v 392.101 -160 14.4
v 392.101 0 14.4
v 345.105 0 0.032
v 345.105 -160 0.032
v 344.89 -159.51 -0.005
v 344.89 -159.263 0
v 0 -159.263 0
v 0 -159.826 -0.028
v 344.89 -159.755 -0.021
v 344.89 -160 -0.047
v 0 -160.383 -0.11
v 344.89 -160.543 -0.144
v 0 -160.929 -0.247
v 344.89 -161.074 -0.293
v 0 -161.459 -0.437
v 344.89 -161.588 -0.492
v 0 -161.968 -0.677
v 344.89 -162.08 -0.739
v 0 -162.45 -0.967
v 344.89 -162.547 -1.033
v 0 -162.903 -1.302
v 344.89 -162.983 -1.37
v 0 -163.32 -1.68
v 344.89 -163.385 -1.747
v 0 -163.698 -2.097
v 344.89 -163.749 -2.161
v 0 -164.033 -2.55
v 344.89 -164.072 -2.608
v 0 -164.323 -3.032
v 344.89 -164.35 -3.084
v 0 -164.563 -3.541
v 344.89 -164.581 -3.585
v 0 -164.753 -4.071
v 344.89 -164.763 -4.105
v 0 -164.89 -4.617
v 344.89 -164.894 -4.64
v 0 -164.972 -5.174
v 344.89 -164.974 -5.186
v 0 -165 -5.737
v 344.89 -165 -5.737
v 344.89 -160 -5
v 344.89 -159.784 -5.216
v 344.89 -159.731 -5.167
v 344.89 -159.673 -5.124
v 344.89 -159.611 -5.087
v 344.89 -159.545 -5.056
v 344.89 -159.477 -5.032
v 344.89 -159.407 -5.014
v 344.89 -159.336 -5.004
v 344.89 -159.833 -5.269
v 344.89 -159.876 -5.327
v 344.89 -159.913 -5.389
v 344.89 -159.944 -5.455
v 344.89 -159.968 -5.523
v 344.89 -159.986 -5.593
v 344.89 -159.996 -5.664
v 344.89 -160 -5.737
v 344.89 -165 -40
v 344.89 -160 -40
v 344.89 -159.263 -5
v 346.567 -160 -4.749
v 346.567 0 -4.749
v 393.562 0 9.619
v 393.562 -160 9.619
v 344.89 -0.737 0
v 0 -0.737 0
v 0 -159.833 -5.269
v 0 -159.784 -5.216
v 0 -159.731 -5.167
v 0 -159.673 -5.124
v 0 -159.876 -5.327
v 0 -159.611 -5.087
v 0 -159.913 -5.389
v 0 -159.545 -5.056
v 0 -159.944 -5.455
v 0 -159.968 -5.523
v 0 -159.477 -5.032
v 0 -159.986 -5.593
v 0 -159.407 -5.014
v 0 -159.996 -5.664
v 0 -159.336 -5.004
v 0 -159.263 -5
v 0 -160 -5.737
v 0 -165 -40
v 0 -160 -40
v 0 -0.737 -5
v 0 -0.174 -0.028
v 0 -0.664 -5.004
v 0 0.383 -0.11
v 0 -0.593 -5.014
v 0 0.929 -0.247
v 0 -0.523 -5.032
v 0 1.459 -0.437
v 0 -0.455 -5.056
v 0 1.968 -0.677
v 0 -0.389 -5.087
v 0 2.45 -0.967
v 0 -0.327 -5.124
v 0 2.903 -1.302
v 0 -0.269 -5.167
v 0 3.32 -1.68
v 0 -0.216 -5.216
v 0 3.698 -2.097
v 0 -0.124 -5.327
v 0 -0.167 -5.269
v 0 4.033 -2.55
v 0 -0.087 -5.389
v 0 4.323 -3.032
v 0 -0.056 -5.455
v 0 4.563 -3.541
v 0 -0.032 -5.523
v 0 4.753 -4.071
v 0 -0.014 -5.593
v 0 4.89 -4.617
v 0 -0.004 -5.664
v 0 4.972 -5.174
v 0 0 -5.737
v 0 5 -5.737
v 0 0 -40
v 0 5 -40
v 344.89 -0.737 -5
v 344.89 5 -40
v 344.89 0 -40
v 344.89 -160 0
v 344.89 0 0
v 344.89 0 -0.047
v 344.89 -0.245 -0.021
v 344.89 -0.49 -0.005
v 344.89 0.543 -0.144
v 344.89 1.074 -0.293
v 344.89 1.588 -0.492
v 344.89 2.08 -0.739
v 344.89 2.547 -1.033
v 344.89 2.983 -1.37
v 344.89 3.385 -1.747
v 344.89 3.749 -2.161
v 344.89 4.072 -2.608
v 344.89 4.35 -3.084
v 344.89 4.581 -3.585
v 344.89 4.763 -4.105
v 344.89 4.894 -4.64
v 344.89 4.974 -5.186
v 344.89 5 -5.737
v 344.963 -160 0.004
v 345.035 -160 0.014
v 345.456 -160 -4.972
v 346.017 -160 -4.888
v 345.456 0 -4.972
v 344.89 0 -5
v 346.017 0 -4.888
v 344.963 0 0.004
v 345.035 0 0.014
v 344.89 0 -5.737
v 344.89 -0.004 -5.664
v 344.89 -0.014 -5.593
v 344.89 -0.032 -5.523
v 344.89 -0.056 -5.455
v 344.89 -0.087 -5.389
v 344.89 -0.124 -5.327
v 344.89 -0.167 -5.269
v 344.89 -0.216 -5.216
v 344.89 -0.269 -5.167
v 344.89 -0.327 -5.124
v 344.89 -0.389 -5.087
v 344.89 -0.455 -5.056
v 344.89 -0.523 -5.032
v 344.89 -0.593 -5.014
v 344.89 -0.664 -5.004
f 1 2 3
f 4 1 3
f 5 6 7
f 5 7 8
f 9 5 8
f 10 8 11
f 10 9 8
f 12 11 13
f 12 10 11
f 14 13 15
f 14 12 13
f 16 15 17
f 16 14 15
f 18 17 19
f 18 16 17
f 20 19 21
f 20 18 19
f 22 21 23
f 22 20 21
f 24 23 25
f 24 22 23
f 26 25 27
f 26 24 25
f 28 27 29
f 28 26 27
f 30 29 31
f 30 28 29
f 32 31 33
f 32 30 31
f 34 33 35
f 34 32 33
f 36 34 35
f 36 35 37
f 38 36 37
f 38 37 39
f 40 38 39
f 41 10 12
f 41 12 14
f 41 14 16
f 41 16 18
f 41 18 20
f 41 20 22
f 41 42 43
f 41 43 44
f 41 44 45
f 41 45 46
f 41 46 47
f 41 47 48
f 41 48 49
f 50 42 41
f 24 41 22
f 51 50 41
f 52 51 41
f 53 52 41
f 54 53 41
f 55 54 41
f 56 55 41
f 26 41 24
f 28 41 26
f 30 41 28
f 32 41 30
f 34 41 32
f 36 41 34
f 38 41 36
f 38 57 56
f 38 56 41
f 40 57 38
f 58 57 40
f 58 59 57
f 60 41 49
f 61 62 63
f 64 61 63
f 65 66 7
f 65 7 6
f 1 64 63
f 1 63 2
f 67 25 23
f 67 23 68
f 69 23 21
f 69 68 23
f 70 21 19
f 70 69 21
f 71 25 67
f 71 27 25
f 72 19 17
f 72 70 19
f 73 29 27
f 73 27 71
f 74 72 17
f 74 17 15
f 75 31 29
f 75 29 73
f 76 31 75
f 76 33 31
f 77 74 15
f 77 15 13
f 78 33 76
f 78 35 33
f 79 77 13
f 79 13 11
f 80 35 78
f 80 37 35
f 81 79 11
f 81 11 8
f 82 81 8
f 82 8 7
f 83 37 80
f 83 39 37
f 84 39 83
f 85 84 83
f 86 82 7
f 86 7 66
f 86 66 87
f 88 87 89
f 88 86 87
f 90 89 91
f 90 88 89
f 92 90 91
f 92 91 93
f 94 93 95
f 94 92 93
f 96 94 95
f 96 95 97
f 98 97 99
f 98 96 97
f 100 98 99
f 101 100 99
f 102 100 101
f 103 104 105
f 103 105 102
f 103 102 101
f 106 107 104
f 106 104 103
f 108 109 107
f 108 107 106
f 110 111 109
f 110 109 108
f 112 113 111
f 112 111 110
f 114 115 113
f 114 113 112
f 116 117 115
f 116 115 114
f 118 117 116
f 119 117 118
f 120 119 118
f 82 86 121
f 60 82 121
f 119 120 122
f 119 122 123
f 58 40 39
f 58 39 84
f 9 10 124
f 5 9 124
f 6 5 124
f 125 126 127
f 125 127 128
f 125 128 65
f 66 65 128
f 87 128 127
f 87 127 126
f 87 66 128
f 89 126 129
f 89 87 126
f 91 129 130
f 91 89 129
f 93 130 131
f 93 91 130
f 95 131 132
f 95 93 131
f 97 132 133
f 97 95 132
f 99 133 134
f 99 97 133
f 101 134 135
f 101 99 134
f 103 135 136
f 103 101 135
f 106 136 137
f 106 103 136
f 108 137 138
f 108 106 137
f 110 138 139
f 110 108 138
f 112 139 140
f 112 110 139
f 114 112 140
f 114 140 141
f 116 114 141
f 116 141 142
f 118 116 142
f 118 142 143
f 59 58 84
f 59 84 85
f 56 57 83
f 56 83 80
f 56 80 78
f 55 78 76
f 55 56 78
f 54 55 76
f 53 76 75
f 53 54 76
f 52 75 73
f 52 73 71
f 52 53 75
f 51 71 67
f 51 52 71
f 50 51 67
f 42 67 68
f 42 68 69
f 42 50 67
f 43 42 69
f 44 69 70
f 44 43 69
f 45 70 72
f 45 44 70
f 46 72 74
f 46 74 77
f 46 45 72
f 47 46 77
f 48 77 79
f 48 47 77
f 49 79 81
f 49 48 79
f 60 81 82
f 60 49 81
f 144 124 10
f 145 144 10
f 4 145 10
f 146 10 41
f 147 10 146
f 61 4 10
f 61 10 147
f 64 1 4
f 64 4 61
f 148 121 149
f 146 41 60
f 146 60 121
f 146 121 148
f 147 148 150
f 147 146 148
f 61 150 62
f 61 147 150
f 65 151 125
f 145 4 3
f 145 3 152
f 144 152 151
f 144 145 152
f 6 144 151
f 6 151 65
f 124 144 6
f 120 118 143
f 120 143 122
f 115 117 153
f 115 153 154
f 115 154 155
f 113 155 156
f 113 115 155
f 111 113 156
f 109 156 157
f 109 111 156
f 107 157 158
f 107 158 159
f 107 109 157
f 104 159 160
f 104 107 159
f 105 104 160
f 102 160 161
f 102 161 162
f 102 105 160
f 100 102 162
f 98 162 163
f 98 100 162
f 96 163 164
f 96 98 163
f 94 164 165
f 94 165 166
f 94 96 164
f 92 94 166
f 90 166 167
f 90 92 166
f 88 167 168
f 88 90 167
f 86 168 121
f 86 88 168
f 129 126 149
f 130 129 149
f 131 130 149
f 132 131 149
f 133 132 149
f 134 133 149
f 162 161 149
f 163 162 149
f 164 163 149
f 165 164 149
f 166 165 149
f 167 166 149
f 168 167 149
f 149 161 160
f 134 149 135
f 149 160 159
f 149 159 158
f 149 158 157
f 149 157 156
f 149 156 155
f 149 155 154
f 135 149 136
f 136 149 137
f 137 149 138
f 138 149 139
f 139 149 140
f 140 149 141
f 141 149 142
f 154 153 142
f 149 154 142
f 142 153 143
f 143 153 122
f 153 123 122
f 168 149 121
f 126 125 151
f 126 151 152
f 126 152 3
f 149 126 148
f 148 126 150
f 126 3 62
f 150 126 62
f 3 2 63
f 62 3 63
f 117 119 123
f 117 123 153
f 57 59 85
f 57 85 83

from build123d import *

# Parameters (mm, degrees)
SKETCH1_W                      = 345
SKETCH1_H                      = 160
BASE_FLANGE1_DEPTH             = 5
EDGE_FLANGE1_STRIP_CUT_DEPTH   = 160
EDGE_FLANGE1_DEPTH             = 160
EDGE_FLANGE2_STRIP_W           = 21.4732
EDGE_FLANGE2_STRIP_H           = 5
EDGE_FLANGE2_STRIP_CUT_DEPTH   = 344.889914392
EDGE_FLANGE2_STRIP_2_W         = 21.4732
EDGE_FLANGE2_STRIP_2_H         = 5
EDGE_FLANGE2_STRIP_CUT_2_DEPTH = 344.889914392
EDGE_FLANGE2_DEPTH             = 344.889914392
EDGE_FLANGE2_BEND_DEPTH        = 344.889914392


# Sheet-metal steps are written as plain solids
with BuildPart() as part:
    # Sketch1 → Base-Flange1 (new body)
    with BuildSketch(Plane.XY):
        with Locations((172.5, -80)):
            Rectangle(SKETCH1_W, SKETCH1_H)
    extrude(amount=-BASE_FLANGE1_DEPTH)

    # Edge-Flange1 strip (across the edge) → Edge-Flange1 strip cut (cut)
    with BuildSketch(Plane(origin=(345, -160, 0), x_dir=(-0.29237170472273066, 0, 0.9563047559630373), z_dir=(0, 1, 0))):
        Polygon((-11.027493953, 18.967789372), (-4.749337863, -1.567133914), (0.032185917, -0.10527539), (-6.245970173, 20.429647896), align=None)
    extrude(amount=EDGE_FLANGE1_STRIP_CUT_DEPTH, mode=Mode.SUBTRACT)

    # Edge-Flange1 section (across the edge) → Edge-Flange1 (add)
    with BuildSketch(Plane(origin=(345, -160, 0), x_dir=(-0.29237170472273066, 0, 0.9563047559630373), z_dir=(0, 1, 0))):
        with BuildLine():
            Line((-5, 0.110085608), (-5, 49.252744993))
            Line((-5, 49.252744993), (0, 49.252744993))
            Line((0, 49.252744993), (0, 0.110085608))
            ThreePointArc((0, 0.110085608), (0.008090915, 0.001209195), (0.032185917, -0.10527539))
            Line((0.032185917, -0.10527539), (-4.749337863, -1.567133914))
            ThreePointArc((-4.749337863, -1.567133914), (-4.936988402, -0.73783786), (-5, 0.110085608))
        make_face()
    extrude(amount=EDGE_FLANGE1_DEPTH)

    # Edge-Flange2 strip (across the edge) → Edge-Flange2 strip cut (cut)
    with BuildSketch(Plane(origin=(344.889914392, -160, -5), x_dir=(0, 1, 0), z_dir=(-1, 0, 0))):
        with Locations((-10, -2.5)):
            Rectangle(EDGE_FLANGE2_STRIP_W, EDGE_FLANGE2_STRIP_H)
    extrude(amount=EDGE_FLANGE2_STRIP_CUT_DEPTH, mode=Mode.SUBTRACT)

    # Edge-Flange2 strip 2 (across the edge) → Edge-Flange2 strip cut 2 (cut)
    with BuildSketch(Plane(origin=(0, 0, -5), x_dir=(0, -1, 0), z_dir=(1, 0, 0))):
        with Locations((-10, -2.5)):
            Rectangle(EDGE_FLANGE2_STRIP_2_W, EDGE_FLANGE2_STRIP_2_H)
    extrude(amount=EDGE_FLANGE2_STRIP_CUT_2_DEPTH, mode=Mode.SUBTRACT)

    # Edge-Flange2 section (across the edge) → Edge-Flange2 (add)
    with BuildSketch(Plane(origin=(344.889914392, -160, -5), x_dir=(0, 1, 0), z_dir=(-1, 0, 0))):
        with BuildLine():
            Line((-5, 0.7366), (-5, 35))
            Line((-5, 35), (0, 35))
            Line((0, 35), (0, 0.7366))
            ThreePointArc((0, 0.7366), (0.215745145, 0.215745145), (0.7366, 0))
            Line((0.7366, 0), (0.7366, -5))
            ThreePointArc((0.7366, -5), (-3.319788761, -3.319788761), (-5, 0.7366))
        make_face()
    extrude(amount=EDGE_FLANGE2_DEPTH)

    # Edge-Flange2 section 2 (across the edge) → Edge-Flange2 bend (add)
    with BuildSketch(Plane(origin=(0, 0, -5), x_dir=(0, -1, 0), z_dir=(1, 0, 0))):
        with BuildLine():
            Line((-5, 0.7366), (-5, 35))
            Line((-5, 35), (0, 35))
            Line((0, 35), (0, 0.7366))
            ThreePointArc((0, 0.7366), (0.215745145, 0.215745145), (0.7366, 0))
            Line((0.7366, 0), (0.7366, -5))
            ThreePointArc((0.7366, -5), (-3.319788761, -3.319788761), (-5, 0.7366))
        make_face()
    extrude(amount=EDGE_FLANGE2_BEND_DEPTH)


solid = part.part
